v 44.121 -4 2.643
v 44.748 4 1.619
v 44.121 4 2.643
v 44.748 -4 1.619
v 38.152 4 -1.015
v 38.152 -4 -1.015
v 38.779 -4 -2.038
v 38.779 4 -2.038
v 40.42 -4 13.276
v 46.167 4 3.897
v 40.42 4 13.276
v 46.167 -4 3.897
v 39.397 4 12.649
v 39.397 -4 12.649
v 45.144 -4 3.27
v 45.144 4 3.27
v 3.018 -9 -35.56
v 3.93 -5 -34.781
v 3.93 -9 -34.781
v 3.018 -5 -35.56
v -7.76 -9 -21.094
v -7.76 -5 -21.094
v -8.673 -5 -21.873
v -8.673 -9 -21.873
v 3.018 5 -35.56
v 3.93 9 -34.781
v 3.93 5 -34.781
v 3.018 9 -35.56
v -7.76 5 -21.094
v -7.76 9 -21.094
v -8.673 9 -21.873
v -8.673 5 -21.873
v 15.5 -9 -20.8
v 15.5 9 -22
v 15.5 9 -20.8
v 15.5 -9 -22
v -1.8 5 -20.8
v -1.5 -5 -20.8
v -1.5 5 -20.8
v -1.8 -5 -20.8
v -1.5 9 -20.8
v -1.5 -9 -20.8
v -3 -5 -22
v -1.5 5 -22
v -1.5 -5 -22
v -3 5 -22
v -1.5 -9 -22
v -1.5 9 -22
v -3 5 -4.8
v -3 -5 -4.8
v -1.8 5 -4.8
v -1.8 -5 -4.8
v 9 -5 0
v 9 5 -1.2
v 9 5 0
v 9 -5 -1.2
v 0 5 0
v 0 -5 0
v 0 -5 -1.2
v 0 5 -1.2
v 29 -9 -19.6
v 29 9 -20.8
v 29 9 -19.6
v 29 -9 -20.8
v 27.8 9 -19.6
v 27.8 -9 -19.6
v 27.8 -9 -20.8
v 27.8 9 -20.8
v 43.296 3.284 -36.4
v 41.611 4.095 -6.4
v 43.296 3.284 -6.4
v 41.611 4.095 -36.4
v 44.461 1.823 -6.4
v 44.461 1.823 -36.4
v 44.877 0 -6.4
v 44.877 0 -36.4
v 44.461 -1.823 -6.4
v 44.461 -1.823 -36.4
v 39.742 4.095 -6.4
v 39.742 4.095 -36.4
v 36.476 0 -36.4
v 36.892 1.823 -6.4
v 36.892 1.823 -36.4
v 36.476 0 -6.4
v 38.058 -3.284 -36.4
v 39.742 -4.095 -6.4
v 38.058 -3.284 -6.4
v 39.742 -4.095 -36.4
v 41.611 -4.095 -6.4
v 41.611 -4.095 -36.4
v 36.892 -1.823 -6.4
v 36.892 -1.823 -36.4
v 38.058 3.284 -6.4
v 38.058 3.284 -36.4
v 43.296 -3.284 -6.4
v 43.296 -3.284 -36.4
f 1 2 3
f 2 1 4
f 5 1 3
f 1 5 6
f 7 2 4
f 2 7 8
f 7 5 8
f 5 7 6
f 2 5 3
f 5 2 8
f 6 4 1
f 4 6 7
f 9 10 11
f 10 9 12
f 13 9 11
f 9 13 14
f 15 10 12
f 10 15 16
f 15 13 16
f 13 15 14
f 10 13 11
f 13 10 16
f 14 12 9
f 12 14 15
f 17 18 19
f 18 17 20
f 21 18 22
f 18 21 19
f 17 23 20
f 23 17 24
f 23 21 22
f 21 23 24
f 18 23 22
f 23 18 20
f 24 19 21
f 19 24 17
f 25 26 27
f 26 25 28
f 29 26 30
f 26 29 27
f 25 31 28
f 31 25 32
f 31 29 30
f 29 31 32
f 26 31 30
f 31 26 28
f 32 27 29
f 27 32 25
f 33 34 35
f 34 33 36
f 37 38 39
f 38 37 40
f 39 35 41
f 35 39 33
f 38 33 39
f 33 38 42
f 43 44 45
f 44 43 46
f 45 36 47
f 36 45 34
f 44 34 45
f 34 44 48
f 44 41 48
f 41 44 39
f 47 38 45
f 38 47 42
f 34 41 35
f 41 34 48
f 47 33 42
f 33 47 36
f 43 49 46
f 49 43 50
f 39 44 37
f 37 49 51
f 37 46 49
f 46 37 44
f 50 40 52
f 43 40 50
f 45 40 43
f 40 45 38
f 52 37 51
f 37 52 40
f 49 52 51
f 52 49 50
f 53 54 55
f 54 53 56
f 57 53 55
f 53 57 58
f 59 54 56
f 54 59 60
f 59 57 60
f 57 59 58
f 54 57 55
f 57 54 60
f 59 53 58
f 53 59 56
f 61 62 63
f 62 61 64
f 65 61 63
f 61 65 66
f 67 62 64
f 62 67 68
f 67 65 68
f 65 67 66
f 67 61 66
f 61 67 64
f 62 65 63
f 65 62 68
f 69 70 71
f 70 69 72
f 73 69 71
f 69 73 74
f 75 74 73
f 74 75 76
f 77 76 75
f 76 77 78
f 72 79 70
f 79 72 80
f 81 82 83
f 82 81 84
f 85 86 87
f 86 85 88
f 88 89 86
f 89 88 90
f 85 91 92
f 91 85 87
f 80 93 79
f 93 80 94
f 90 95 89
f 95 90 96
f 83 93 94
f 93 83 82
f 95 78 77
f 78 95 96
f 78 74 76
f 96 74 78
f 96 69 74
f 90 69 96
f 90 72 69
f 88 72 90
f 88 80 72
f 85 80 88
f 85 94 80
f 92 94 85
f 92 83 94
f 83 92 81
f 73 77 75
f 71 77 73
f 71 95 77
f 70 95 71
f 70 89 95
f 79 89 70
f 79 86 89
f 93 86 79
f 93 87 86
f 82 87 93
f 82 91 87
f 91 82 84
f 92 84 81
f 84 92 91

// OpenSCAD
// Parameters
clip_type = 0; //[0:2:1]
open_ratio = 0.9; //[0.1:1:0.05]
include_spigot_hole = 1; //[0:1:1]
hole_depth = 0; //[0:50:1]
t = 1.2; //[0.6:2.4:0.1]
length = 45; //[25:90:1]
width = 18; //[10:36:1]
height = 22; //[12:44:1]
arm_l = 18; //[10:36:1]
arm_w = 4; //[2:8:0.5]
hinge_offset = 14; //[8:28:1]
hook_x = 12; //[6:24:1]
hook_y = 10; //[6:20:1]
spigot_x = 10; //[6:20:1]
spigot_y = 8; //[5:16:1]
spigot_z = 14; //[8:28:1]
bend_r = 3; //[1.5:6:0.5]
overlap = 1; //[0.5:2:0.1]
arm_angle_deg = 55; //[10:80:1]
spigot_angle_deg = 35; //[5:60:1]
hole_clearance = 0.2; //[0.05:0.6:0.05]
hole_tool_h = 30; //[10:80:1]

// Swiss Clip - complete geometry
module swiss_clip() {
  color([0.85, 0.85, 0.8]) {
    union() {
      // Swiss Clip Body
      translate([(-t - (bend_r - t))/2 + ((hinge_offset - spigot_x + (length - hinge_offset - arm_l)) / 2), 0, -height + t/2])
        cube([hinge_offset - spigot_x + (length - hinge_offset - arm_l), width, t], center=true);

      // Hook Section
      translate([(-t - (bend_r - t)) + hook_x/2, 0, -height + t/2])
        cube([hook_x, hook_y, t], center=true);
      translate([(-t - (bend_r - t)) + t/2, 0, -height + t + (height - 2*bend_r)/2])
        cube([t, hook_y, height - 2*bend_r], center=true);
      translate([(-t - (bend_r - t)) + bend_r + (hook_x - bend_r)/2, 0, -t/2])
        cube([hook_x - bend_r, hook_y, t], center=true);

      // Spigot Hinge
      rotate([0, -(spigot_angle_deg*open_ratio), 0]) {
        translate([(-t - (bend_r - t)) + (length - spigot_x) + (spigot_x - bend_r)/2, 0, -height + t/2])
          cube([spigot_x - bend_r, spigot_y, t], center=true);
        translate([(-t - (bend_r - t)) + (length - t) + t/2 - t/2, 0, -height + t + (spigot_z - bend_r)/2])
          cube([t, spigot_y, spigot_z - bend_r], center=true);
        translate([(-t - (bend_r - t)) + (length - bend_r), 0, -height + t + bend_r])
          rotate_extrude() square([t, spigot_y], center=true);
      }

      // Clip Arms
      rotate([0, arm_angle_deg*open_ratio, 0]) {
        translate([(-t - (bend_r - t)) + (length - hinge_offset) - arm_l/2 + overlap, -(width/2 - arm_w/2), -height + t/2 + t])
          cube([arm_l, arm_w, t], center=true);
        translate([(-t - (bend_r - t)) + (length - hinge_offset) - arm_l/2 + overlap, (width/2 - arm_w/2), -height + t/2 + t])
          cube([arm_l, arm_w, t], center=true);
      }

      // Gussets Stiffeners
      translate([(-t - (bend_r - t)) + (length - hinge_offset) - t/2 + overlap, 0, -height + t + t/2])
        cube([t, width - 2*arm_w, t], center=true);
      translate([(-t - (bend_r - t)) + (length - hinge_offset) - t/2 + overlap, -(width/2 - arm_w/2), -height + t + t/2])
        cube([t, arm_w, t], center=true);
      translate([(-t - (bend_r - t)) + (length - hinge_offset) - t/2 + overlap, (width/2 - arm_w/2), -height + t + t/2])
        cube([t, arm_w, t], center=true);
    }
  }
}

// Swiss Clip Hole - complete geometry
module swiss_clip_hole() {
  if (include_spigot_hole) {
    color([0.2, 0.2, 0.2]) {
      translate([(-t - (bend_r - t)) + (length - hinge_offset) + (hinge_offset - t)*cos((spigot_angle_deg*open_ratio)*3.141592653589793/180) - (spigot_z - t)*sin((spigot_angle_deg*open_ratio)*3.141592653589793/180), 0, -height + t/2])
        cylinder(r=(sqrt((spigot_z*sin((spigot_angle_deg*open_ratio)*3.141592653589793/180))^2 + (spigot_y)^2)/2) + hole_clearance, h=(hole_depth > 0 ? hole_depth : hole_tool_h), center=true);
    }
  }
}

// Assembly
module assembly() {
  swiss_clip();
  swiss_clip_hole();
}

assembly();
